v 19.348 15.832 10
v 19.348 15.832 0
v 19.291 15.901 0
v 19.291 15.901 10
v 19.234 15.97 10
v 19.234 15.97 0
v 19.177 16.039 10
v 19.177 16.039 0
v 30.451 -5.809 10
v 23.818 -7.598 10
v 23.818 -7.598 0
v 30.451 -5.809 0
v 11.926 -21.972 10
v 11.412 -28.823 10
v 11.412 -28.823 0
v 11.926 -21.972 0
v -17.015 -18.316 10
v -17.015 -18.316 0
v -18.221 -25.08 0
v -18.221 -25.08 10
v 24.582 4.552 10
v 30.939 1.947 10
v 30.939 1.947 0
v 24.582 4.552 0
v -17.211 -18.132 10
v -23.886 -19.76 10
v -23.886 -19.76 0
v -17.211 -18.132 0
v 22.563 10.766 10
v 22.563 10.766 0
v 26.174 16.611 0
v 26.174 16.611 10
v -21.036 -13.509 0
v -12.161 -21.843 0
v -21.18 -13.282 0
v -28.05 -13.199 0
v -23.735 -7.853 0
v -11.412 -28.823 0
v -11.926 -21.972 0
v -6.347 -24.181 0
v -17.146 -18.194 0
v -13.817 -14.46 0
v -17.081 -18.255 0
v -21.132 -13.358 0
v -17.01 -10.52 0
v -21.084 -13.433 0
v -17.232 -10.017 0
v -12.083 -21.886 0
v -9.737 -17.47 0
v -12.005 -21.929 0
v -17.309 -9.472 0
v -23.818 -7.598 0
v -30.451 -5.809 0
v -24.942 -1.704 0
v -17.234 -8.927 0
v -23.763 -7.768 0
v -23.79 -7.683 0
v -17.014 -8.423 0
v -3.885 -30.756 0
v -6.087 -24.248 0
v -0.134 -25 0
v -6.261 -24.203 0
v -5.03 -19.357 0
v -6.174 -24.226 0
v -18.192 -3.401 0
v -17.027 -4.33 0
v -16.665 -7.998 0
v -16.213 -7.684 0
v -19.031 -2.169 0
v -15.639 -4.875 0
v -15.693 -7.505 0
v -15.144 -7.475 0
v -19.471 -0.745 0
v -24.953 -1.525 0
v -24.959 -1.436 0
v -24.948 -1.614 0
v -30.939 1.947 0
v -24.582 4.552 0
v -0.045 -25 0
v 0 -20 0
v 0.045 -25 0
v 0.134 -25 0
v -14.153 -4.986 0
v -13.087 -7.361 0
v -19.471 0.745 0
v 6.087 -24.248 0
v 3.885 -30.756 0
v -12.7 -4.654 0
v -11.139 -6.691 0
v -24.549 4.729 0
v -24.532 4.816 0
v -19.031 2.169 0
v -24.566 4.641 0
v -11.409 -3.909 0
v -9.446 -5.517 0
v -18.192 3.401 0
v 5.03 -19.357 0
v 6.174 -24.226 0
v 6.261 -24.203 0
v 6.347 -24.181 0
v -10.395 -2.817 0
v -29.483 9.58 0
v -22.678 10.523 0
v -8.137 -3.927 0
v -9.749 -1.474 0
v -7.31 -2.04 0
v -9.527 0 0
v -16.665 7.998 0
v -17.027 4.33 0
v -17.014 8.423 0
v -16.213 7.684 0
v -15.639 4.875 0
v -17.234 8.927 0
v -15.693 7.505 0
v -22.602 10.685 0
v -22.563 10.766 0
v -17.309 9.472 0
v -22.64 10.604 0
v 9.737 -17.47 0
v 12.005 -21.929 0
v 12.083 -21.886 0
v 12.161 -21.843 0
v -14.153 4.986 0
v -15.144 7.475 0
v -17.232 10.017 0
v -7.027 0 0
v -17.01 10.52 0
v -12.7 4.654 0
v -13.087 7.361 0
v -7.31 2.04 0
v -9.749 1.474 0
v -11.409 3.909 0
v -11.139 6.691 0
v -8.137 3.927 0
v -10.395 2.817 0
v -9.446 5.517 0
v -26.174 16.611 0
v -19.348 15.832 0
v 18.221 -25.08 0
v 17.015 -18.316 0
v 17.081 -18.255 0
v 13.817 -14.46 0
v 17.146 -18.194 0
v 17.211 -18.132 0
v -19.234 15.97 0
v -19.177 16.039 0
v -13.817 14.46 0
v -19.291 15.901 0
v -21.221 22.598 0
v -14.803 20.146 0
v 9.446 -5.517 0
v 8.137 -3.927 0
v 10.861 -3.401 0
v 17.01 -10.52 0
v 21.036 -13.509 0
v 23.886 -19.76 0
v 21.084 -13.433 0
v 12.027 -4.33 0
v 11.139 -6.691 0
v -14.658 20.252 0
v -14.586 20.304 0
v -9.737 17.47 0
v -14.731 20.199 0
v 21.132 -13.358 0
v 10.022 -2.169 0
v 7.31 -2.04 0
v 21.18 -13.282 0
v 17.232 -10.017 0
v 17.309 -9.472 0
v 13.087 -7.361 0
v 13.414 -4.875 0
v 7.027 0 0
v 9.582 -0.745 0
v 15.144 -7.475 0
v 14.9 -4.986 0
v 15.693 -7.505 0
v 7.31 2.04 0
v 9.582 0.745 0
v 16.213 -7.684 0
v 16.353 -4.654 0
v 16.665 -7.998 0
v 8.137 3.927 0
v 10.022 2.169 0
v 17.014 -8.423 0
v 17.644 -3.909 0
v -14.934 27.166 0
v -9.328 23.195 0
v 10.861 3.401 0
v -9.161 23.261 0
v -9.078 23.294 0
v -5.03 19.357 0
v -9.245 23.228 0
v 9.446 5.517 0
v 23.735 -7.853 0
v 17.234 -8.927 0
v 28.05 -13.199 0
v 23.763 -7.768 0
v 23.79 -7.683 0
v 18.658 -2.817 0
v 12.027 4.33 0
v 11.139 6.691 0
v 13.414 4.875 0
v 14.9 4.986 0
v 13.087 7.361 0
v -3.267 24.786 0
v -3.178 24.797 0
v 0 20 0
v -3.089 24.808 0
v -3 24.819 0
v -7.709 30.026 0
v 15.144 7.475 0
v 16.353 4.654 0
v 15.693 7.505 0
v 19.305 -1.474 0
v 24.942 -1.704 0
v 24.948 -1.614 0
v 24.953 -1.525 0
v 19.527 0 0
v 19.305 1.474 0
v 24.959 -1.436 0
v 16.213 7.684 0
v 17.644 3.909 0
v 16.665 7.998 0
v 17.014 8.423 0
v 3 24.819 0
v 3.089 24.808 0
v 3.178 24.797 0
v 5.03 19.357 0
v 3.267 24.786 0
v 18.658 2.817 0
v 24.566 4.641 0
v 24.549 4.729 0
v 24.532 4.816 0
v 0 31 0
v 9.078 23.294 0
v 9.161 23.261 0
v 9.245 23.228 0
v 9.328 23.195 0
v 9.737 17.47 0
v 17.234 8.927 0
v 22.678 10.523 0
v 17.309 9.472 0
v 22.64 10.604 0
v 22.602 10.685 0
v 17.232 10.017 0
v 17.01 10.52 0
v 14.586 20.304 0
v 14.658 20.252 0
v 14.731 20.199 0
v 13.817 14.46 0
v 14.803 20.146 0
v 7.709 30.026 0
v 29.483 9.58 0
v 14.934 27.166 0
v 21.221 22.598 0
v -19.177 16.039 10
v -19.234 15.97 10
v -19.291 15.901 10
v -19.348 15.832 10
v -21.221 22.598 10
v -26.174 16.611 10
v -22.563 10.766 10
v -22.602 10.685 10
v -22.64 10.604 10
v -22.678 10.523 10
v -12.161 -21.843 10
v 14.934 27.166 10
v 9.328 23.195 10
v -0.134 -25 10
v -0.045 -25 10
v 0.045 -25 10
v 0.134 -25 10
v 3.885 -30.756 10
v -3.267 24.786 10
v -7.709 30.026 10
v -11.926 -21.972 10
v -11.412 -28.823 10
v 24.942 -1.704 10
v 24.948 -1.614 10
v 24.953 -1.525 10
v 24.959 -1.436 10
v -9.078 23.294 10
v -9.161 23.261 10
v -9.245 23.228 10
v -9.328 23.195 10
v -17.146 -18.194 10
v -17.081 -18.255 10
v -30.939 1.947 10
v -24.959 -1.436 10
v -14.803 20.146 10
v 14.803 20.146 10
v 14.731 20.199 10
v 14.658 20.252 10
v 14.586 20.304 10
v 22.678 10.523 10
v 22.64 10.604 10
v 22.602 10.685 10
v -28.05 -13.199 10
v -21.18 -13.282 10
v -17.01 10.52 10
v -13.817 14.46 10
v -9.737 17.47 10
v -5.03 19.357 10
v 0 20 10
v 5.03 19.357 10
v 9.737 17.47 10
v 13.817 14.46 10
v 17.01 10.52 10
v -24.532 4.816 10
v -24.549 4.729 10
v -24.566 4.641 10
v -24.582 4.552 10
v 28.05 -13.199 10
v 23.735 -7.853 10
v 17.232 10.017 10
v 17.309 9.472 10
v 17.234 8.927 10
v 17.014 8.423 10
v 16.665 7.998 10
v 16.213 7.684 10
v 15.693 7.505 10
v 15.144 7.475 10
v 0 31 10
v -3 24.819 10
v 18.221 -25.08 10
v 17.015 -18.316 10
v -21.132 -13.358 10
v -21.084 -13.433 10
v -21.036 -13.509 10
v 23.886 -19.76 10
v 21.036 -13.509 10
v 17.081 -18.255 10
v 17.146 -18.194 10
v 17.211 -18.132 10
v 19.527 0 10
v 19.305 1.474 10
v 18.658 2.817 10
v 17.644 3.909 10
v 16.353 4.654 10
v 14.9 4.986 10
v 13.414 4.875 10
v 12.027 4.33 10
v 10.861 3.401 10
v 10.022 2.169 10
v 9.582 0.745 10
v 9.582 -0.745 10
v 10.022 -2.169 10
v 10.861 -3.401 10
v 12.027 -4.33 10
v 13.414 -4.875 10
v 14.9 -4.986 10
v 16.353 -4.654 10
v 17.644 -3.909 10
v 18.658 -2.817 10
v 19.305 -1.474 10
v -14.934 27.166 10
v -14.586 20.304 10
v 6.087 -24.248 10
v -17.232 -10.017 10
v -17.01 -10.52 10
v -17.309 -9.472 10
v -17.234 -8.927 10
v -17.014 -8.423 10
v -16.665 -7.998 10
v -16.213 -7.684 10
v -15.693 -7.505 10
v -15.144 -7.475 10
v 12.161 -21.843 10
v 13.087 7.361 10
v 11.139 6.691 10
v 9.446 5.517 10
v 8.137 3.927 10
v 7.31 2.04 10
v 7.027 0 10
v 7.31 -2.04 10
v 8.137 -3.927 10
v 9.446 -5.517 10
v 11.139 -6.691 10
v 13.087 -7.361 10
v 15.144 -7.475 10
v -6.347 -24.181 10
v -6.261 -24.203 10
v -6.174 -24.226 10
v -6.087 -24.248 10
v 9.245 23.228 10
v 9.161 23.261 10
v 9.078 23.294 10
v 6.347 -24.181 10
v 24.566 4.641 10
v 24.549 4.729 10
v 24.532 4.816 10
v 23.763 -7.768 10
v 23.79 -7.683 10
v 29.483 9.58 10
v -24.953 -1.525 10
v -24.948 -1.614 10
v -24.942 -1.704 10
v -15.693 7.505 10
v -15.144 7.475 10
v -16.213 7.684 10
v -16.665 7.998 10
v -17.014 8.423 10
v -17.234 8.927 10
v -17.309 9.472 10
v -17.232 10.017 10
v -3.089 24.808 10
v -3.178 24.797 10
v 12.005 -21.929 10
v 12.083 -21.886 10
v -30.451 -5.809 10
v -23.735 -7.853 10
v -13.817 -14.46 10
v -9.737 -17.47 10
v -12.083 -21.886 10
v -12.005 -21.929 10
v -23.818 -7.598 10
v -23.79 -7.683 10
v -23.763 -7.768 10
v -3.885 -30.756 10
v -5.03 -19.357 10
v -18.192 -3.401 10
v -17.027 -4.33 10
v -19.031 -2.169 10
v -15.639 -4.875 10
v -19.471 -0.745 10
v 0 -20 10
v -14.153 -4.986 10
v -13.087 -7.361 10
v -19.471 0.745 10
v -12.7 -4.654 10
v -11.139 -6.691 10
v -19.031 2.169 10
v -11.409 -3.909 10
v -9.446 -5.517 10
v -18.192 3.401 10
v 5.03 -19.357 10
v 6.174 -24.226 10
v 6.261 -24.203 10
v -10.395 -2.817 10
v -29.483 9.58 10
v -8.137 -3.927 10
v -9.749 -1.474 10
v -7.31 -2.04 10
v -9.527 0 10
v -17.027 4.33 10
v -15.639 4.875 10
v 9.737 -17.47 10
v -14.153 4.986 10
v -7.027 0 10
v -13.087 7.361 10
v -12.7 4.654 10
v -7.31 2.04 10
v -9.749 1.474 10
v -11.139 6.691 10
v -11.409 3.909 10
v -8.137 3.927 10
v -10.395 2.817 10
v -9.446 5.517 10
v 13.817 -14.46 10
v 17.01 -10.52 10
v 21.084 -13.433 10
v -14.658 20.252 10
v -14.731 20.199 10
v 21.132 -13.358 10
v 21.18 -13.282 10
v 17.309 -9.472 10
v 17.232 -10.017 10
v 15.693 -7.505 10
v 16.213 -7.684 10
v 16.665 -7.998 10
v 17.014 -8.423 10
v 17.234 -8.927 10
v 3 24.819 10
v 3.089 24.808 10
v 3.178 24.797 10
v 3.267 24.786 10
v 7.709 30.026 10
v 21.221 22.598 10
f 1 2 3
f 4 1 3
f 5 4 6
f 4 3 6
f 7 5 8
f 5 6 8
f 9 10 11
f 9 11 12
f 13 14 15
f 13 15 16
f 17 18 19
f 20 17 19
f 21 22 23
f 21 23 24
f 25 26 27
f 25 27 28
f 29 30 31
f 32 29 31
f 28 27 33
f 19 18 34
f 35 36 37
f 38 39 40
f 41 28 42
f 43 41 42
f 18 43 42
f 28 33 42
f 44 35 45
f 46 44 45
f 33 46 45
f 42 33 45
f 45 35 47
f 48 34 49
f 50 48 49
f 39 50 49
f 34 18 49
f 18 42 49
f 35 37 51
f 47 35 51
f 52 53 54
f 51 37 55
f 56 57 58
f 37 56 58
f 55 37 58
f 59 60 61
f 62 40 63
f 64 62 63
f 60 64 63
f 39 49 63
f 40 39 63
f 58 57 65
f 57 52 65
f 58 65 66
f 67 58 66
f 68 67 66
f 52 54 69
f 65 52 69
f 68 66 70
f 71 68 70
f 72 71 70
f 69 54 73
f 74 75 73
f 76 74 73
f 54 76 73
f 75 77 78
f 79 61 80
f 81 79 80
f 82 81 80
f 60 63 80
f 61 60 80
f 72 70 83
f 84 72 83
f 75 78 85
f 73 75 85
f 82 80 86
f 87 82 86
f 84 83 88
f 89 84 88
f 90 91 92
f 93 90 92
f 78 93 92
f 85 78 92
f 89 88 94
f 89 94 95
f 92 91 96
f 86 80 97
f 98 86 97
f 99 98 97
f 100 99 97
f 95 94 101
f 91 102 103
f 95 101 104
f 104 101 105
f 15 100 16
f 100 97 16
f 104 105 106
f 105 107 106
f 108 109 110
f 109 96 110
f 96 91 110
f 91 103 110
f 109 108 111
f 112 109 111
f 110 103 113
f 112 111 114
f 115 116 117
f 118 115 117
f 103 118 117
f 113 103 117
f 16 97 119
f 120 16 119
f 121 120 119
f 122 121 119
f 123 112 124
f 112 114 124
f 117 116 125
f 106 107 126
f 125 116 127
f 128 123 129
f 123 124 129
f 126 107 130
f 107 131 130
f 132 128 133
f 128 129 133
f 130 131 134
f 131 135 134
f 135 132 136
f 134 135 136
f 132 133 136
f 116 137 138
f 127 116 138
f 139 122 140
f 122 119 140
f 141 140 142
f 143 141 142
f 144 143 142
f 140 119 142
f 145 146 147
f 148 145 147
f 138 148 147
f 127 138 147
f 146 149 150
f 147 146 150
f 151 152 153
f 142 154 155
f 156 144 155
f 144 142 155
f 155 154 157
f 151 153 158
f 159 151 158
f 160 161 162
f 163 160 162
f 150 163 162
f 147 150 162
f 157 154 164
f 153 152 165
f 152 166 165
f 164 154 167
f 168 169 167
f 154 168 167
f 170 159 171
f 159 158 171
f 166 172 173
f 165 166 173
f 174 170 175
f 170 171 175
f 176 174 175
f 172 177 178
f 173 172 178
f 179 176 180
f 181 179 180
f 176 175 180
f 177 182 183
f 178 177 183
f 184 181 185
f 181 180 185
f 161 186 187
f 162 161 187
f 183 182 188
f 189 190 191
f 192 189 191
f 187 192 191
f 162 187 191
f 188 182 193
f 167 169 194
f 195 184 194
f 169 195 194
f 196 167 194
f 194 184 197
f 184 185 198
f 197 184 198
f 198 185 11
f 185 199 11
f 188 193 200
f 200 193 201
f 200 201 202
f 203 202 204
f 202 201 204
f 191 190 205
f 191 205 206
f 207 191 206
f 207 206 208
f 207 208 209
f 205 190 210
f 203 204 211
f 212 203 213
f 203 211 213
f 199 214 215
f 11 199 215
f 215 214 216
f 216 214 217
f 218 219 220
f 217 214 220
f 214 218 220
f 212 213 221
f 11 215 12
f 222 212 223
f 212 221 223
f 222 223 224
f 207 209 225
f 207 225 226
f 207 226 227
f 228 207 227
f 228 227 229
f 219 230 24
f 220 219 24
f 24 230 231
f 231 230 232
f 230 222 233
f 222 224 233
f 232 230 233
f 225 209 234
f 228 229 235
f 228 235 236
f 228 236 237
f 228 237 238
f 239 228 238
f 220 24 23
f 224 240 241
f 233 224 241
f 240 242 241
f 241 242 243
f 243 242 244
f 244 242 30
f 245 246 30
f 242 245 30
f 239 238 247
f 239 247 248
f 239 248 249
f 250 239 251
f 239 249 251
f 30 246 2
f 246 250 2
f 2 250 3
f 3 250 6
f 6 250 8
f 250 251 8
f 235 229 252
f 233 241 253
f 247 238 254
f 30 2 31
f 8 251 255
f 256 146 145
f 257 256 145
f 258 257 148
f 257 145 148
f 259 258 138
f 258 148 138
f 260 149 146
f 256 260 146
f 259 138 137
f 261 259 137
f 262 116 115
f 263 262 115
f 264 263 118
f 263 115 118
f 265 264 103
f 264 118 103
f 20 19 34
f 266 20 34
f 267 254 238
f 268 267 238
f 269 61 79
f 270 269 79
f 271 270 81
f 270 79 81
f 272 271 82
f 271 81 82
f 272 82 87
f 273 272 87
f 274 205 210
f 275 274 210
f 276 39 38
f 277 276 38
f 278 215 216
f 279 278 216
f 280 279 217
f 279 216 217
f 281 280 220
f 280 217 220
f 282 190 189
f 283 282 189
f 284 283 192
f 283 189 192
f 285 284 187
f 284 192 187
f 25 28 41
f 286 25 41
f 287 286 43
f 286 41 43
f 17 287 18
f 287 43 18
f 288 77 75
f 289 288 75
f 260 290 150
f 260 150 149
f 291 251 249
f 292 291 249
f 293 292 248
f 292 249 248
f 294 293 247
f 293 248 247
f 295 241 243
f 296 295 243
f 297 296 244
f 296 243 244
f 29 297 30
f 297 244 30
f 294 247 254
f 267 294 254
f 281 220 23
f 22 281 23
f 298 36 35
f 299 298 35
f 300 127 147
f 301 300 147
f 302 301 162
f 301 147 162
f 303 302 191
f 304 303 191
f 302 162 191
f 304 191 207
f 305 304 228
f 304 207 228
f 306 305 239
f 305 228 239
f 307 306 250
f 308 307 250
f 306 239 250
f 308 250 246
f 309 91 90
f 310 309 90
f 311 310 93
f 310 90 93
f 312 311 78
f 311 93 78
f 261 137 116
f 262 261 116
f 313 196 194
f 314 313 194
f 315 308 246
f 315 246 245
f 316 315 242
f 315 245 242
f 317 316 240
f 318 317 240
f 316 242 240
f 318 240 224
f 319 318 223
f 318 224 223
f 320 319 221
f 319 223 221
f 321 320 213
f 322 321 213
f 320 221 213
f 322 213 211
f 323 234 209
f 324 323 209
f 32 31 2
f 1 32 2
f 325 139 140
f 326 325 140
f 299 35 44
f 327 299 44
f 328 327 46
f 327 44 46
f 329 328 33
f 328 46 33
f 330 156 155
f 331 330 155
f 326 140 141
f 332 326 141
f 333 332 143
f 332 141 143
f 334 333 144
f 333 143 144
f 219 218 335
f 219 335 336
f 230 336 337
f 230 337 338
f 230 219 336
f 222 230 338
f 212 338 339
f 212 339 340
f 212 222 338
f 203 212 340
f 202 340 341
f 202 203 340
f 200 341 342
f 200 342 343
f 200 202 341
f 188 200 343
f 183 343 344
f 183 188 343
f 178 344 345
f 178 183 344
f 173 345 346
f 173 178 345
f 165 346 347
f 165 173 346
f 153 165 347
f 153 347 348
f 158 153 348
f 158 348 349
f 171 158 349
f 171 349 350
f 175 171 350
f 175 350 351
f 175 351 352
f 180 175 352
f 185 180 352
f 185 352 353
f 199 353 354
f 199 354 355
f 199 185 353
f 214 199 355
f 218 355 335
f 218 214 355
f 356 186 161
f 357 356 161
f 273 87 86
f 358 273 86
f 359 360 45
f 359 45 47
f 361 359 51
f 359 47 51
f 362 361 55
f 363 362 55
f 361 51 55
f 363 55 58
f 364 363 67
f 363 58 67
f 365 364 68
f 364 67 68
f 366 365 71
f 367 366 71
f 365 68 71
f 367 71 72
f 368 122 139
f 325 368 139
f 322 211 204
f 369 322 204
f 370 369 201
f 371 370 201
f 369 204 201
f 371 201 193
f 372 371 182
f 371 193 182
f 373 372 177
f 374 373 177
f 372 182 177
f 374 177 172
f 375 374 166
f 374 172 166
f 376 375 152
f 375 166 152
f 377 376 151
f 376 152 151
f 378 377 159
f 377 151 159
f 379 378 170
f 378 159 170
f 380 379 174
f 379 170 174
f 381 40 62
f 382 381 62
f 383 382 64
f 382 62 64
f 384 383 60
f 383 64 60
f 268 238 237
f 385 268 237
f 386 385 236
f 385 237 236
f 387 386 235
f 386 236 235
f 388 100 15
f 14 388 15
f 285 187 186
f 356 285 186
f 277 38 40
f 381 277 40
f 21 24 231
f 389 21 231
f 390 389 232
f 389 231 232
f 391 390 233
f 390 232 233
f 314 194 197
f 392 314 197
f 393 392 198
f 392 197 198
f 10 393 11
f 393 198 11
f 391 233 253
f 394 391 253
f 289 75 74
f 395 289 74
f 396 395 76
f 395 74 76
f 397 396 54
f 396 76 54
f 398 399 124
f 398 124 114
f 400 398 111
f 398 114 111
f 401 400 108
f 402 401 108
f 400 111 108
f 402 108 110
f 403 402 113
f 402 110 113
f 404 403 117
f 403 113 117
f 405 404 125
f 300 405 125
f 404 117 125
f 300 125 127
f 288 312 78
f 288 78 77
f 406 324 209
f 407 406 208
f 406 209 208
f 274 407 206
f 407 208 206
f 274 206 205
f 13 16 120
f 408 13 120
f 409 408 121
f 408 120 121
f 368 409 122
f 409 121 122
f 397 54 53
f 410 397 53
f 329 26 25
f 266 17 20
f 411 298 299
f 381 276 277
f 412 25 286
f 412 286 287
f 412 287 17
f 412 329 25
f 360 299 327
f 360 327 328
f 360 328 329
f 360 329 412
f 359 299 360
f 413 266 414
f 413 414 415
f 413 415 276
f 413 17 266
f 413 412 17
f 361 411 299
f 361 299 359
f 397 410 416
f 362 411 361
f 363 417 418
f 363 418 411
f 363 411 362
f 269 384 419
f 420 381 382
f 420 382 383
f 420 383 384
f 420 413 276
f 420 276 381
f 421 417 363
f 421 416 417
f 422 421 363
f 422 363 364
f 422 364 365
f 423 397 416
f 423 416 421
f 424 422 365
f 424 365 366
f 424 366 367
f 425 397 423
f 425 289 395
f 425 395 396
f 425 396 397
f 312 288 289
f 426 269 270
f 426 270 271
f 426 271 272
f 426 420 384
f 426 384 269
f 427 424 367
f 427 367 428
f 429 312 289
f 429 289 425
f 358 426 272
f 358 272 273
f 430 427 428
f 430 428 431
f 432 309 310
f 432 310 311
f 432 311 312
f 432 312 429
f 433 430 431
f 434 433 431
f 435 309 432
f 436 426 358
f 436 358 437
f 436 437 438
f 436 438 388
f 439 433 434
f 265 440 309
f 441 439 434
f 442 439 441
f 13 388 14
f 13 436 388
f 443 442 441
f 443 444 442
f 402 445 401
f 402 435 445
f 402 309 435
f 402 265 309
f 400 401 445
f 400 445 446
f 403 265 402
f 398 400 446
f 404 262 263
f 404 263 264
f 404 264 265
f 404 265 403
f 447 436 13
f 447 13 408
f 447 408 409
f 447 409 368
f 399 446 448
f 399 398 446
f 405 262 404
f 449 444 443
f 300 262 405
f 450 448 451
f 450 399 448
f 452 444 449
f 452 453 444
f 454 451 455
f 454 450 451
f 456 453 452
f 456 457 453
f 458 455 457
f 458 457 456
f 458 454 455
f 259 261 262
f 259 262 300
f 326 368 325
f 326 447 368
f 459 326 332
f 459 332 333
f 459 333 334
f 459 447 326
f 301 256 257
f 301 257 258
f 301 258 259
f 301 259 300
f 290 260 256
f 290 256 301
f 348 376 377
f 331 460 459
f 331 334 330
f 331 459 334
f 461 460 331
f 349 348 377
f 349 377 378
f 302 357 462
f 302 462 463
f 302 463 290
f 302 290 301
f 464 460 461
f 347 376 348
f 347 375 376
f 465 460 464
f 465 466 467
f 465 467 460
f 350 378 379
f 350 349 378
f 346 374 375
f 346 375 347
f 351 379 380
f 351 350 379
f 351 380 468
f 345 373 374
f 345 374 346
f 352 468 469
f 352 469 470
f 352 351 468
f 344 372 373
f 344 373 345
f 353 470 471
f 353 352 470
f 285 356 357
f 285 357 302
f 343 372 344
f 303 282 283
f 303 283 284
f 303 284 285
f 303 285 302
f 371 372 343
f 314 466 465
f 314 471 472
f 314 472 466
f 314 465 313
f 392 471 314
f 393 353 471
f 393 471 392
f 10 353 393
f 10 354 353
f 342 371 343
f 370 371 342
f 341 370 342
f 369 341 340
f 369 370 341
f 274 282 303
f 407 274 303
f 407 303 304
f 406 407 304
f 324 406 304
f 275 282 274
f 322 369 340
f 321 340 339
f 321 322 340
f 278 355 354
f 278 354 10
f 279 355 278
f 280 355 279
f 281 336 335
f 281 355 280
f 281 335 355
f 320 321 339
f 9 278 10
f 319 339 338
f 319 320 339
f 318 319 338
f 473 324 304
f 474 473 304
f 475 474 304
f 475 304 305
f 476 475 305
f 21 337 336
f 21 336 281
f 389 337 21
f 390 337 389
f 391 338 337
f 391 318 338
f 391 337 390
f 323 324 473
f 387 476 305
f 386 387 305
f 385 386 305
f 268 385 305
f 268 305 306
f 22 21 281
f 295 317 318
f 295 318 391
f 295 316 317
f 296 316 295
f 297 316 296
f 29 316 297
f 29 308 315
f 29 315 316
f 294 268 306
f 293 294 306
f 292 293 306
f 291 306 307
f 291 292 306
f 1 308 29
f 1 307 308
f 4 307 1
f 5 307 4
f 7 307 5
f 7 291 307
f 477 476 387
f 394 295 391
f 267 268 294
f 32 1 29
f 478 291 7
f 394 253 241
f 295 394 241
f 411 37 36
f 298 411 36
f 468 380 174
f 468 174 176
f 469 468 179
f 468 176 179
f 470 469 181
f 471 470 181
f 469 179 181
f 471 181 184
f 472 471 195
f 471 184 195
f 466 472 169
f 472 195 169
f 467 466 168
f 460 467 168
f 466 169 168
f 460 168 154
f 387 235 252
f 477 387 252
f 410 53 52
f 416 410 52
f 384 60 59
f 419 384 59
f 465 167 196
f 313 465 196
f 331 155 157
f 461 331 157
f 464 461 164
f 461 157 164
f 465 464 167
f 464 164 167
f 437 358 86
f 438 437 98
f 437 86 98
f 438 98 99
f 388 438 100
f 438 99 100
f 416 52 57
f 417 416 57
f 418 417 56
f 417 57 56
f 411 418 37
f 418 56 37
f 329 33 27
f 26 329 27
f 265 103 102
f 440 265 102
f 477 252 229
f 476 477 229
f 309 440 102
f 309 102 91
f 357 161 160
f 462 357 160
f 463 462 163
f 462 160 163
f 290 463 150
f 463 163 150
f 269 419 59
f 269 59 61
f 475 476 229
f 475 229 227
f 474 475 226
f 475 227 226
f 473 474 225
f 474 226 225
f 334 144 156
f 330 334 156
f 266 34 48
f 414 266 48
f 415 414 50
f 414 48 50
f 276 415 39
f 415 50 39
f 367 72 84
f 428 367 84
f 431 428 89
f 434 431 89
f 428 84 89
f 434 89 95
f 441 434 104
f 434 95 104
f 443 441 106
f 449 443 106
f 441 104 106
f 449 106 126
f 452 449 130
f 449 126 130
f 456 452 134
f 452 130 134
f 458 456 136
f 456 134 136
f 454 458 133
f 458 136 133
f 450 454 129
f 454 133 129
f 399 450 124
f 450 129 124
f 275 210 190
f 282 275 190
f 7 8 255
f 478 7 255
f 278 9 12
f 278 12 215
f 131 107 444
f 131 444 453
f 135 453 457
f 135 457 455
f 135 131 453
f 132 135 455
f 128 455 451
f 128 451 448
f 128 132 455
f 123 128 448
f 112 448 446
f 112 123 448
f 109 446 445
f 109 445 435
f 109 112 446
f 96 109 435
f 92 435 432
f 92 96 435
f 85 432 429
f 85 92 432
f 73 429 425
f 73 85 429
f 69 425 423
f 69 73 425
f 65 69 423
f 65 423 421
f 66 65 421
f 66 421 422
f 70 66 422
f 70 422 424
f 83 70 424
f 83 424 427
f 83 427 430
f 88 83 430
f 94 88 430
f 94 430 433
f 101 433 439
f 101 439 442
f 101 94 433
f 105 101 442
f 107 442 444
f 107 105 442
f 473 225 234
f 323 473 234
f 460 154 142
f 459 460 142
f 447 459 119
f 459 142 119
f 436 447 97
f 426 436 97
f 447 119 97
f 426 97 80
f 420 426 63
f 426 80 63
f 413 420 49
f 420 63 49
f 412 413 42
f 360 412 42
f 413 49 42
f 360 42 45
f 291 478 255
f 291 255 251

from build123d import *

# Parameters (mm, degrees)
F0_R     = 5
F1_DEPTH = 10


with BuildPart() as f1:
    # F0 (on Top) → F1 (new body)
    with BuildSketch(Plane.XY):
        with BuildLine():
            Line((-14.934364, 27.165507), (-14.585732, 20.304099))
            ThreePointArc((-14.585732, 20.304099), (-14.694631, 20.225425), (-14.803106, 20.146167))
            Line((-14.803106, 20.146167), (-21.22096, 22.598027))
            Line((-21.22096, 22.598027), (-19.176918, 16.038884))
            ThreePointArc((-19.176918, 16.038884), (-19.262831, 15.9356), (-19.348188, 15.831855))
            Line((-19.348188, 15.831855), (-26.174166, 16.610631))
            Line((-26.174166, 16.610631), (-22.563148, 10.765888))
            ThreePointArc((-22.563148, 10.765888), (-22.620676, 10.644482), (-22.677551, 10.52277))
            Line((-22.677551, 10.52277), (-29.482752, 9.579527))
            Line((-29.482752, 9.579527), (-24.531653, 4.816431))
            ThreePointArc((-24.531653, 4.816431), (-24.557181, 4.684533), (-24.582, 4.5525))
            Line((-24.582, 4.5525), (-30.938829, 1.946506))
            Line((-30.938829, 1.946506), (-24.958744, -1.43566))
            ThreePointArc((-24.958744, -1.43566), (-24.950668, -1.569763), (-24.941872, -1.70382))
            Line((-24.941872, -1.70382), (-30.450905, -5.808821))
            Line((-30.450905, -5.808821), (-23.817584, -7.597544))
            ThreePointArc((-23.817584, -7.597544), (-23.776413, -7.725425), (-23.734555, -7.853083))
            Line((-23.734555, -7.853083), (-28.049639, -13.199158))
            Line((-28.049639, -13.199158), (-21.179879, -13.282045))
            ThreePointArc((-21.179879, -13.282045), (-21.108198, -13.39567), (-21.035908, -13.508908))
            Line((-21.035908, -13.508908), (-23.885911, -19.760144))
            Line((-23.885911, -19.760144), (-17.211364, -18.131987))
            ThreePointArc((-17.211364, -18.131987), (-17.113678, -18.224216), (-17.015497, -18.315918))
            Line((-17.015497, -18.315918), (-18.221343, -25.079527))
            Line((-18.221343, -25.079527), (-12.161395, -21.84263))
            ThreePointArc((-12.161395, -21.84263), (-12.043842, -21.907667), (-11.925941, -21.972072))
            Line((-11.925941, -21.972072), (-11.411861, -28.823071))
            Line((-11.411861, -28.823071), (-6.347282, -24.180819))
            ThreePointArc((-6.347282, -24.180819), (-6.217247, -24.214579), (-6.087033, -24.24764))
            Line((-6.087033, -24.24764), (-3.88533, -30.755556))
            Line((-3.88533, -30.755556), (-0.134345, -24.999639))
            ThreePointArc((-0.134345, -24.999639), (0, -25), (0.134345, -24.999639))
            Line((0.134345, -24.999639), (3.88533, -30.755556))
            Line((3.88533, -30.755556), (6.087033, -24.24764))
            ThreePointArc((6.087033, -24.24764), (6.217247, -24.214579), (6.347282, -24.180819))
            Line((6.347282, -24.180819), (11.411861, -28.823071))
            Line((11.411861, -28.823071), (11.925941, -21.972072))
            ThreePointArc((11.925941, -21.972072), (12.043842, -21.907667), (12.161395, -21.84263))
            Line((12.161395, -21.84263), (18.221343, -25.079527))
            Line((18.221343, -25.079527), (17.015497, -18.315918))
            ThreePointArc((17.015497, -18.315918), (17.113678, -18.224216), (17.211364, -18.131987))
            Line((17.211364, -18.131987), (23.885911, -19.760144))
            Line((23.885911, -19.760144), (21.035908, -13.508908))
            ThreePointArc((21.035908, -13.508908), (21.108198, -13.39567), (21.179879, -13.282045))
            Line((21.179879, -13.282045), (28.049639, -13.199158))
            Line((28.049639, -13.199158), (23.734555, -7.853083))
            ThreePointArc((23.734555, -7.853083), (23.776413, -7.725425), (23.817584, -7.597544))
            Line((23.817584, -7.597544), (30.450905, -5.808821))
            Line((30.450905, -5.808821), (24.941872, -1.70382))
            ThreePointArc((24.941872, -1.70382), (24.950668, -1.569763), (24.958744, -1.43566))
            Line((24.958744, -1.43566), (30.938829, 1.946506))
            Line((30.938829, 1.946506), (24.582, 4.5525))
            ThreePointArc((24.582, 4.5525), (24.557181, 4.684533), (24.531653, 4.816431))
            Line((24.531653, 4.816431), (29.482752, 9.579527))
            Line((29.482752, 9.579527), (22.677551, 10.52277))
            ThreePointArc((22.677551, 10.52277), (22.620676, 10.644482), (22.563148, 10.765888))
            Line((22.563148, 10.765888), (26.174166, 16.610631))
            Line((26.174166, 16.610631), (19.348188, 15.831855))
            ThreePointArc((19.348188, 15.831855), (19.262831, 15.9356), (19.176918, 16.038884))
            Line((19.176918, 16.038884), (21.22096, 22.598027))
            Line((21.22096, 22.598027), (14.803106, 20.146167))
            ThreePointArc((14.803106, 20.146167), (14.694631, 20.225425), (14.585732, 20.304099))
            Line((14.585732, 20.304099), (14.934364, 27.165507))
            Line((14.934364, 27.165507), (9.327892, 23.194621))
            ThreePointArc((9.327892, 23.194621), (9.203114, 23.244412), (9.07807, 23.293532))
            Line((9.07807, 23.293532), (7.709387, 30.026078))
            Line((7.709387, 30.026078), (3.266571, 24.785672))
            ThreePointArc((3.266571, 24.785672), (3.133331, 24.802868), (3, 24.819347))
            Line((3, 24.819347), (0, 31))
            Line((0, 31), (-3, 24.819347))
            ThreePointArc((-3, 24.819347), (-3.133331, 24.802868), (-3.266571, 24.785672))
            Line((-3.266571, 24.785672), (-7.709387, 30.026078))
            Line((-7.709387, 30.026078), (-9.07807, 23.293532))
            ThreePointArc((-9.07807, 23.293532), (-9.203114, 23.244412), (-9.327892, 23.194621))
            Line((-9.327892, 23.194621), (-14.934364, 27.165507))
        make_face()
        with Locations((-14.526644, 0)):
            Circle(F0_R, mode=Mode.SUBTRACT)
        with BuildLine():
            ThreePointArc((17.00987, -10.519711), (0, -20), (-17.00987, -10.519711))
            ThreePointArc((-17.00987, -10.519711), (-17.014268, -8.422914), (-15.144201, -7.474532))
            ThreePointArc((-15.144201, -7.474532), (-7.026644, 0), (-15.144201, 7.474532))
            ThreePointArc((-15.144201, 7.474532), (-17.014268, 8.422914), (-17.00987, 10.519711))
            ThreePointArc((-17.00987, 10.519711), (0, 20), (17.00987, 10.519711))
            ThreePointArc((17.00987, 10.519711), (17.014268, 8.422914), (15.144201, 7.474532))
            ThreePointArc((15.144201, 7.474532), (7.026644, 0), (15.144201, -7.474532))
            ThreePointArc((15.144201, -7.474532), (17.014268, -8.422914), (17.00987, -10.519711))
        make_face(mode=Mode.SUBTRACT)
        with Locations((14.526644, 0)):
            Circle(F0_R, mode=Mode.SUBTRACT)
    extrude(amount=F1_DEPTH)


solid = f1.part
